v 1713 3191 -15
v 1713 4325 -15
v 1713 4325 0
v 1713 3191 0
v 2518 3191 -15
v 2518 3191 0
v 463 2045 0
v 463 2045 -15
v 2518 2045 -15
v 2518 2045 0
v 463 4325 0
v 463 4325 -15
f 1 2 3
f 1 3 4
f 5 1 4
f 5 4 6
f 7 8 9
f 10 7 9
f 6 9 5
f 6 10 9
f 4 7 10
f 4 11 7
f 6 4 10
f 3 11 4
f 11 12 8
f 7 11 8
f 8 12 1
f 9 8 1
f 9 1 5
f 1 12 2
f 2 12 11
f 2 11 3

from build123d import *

# Parameters (mm, degrees)
TABAN_FLAN_1_DEPTH          = 15
KES_EKSTR_ZYON1_DEPTH       = 6824.599709831
KES_EKSTR_ZYON1_DEPTH_BACK  = 6824.599709831
IZIM2_W                     = 2518
IZIM2_H                     = 130
KES_EKSTR_ZYON2_DEPTH       = 6824.599709831
KES_EKSTR_ZYON2_DEPTH_BACK  = 6824.599709831
IZIM3_W                     = 2518
IZIM3_H                     = 135
KES_EKSTR_ZYON3_DEPTH       = 6824.599709831
KES_EKSTR_ZYON3_DEPTH_BACK  = 6824.599709831
IZIM4_W                     = 848
IZIM4_H                     = 915
KES_EKSTR_ZYON4_DEPTH       = 5983.714935546
KES_EKSTR_ZYON4_DEPTH_BACK  = 5983.714935546
IZIM5_W                     = 848
IZIM5_H                     = 467
KES_EKSTR_ZYON5_DEPTH       = 5563.566763644
KES_EKSTR_ZYON5_DEPTH_BACK  = 5563.566763644
IZIM6_W                     = 2518
IZIM6_H                     = 805
IZIM6_W_2                   = 848
IZIM6_H_2                   = 3
KES_EKSTR_ZYON6_DEPTH       = 5560.891905424
KES_EKSTR_ZYON6_DEPTH_BACK  = 5560.891905424
IZIM7_W                     = 2518
IZIM7_H                     = 440
KES_EKSTR_ZYON7_DEPTH       = 5560.891905424
KES_EKSTR_ZYON7_DEPTH_BACK  = 5560.891905424
IZIM8_W                     = 2518
IZIM8_H                     = 102
KES_EKSTR_ZYON8_DEPTH       = 5560.891905424
KES_EKSTR_ZYON8_DEPTH_BACK  = 5560.891905424
IZIM9_W                     = 2518
IZIM9_H                     = 158
IZIM10_W                    = 542
IZIM10_H                    = 327
SEKME1_DEPTH                = 15
KES_EKSTR_ZYON9_DEPTH       = 5560.891905424
KES_EKSTR_ZYON9_DEPTH_BACK  = 5560.891905424
IZIM11_W                    = 1127
IZIM11_H                    = 305
IZIM12_W                    = 1390
IZIM12_H                    = 43
SEKME2_DEPTH                = 15
KES_EKSTR_ZYON10_DEPTH      = 5599.263034192
KES_EKSTR_ZYON10_DEPTH_BACK = 5599.263034192
IZIM13_W                    = 2518
IZIM13_H                    = 127
KES_EKSTR_ZYON11_DEPTH      = 5599.263034192
KES_EKSTR_ZYON11_DEPTH_BACK = 5599.263034192
IZIM14_W                    = 385
IZIM14_H                    = 675
IZIM14_W_2                  = 2518
IZIM14_H_2                  = 148
KES_EKSTR_ZYON12_DEPTH      = 5599.263034192
KES_EKSTR_ZYON12_DEPTH_BACK = 5599.263034192
IZIM15_W                    = 569.702453624
IZIM15_H                    = 675
KES_EKSTR_ZYON13_DEPTH      = 5599.263034192
KES_EKSTR_ZYON13_DEPTH_BACK = 5599.263034192
IZIM16_W                    = 1005
IZIM16_H                    = 305
KES_EKSTR_ZYON14_DEPTH      = 5328.623672896
KES_EKSTR_ZYON14_DEPTH_BACK = 5328.623672896
IZIM17_W                    = 200
IZIM17_H                    = 370
IZIM17_W_2                  = 3
IZIM17_H_2                  = 2280
KES_EKSTR_ZYON16_DEPTH      = 5005.615269928
KES_EKSTR_ZYON16_DEPTH_BACK = 5005.615269928
KES_EKSTR_ZYON17_DEPTH      = 5005.615269928
KES_EKSTR_ZYON17_DEPTH_BACK = 5005.615269928
IZIM20_W                    = 805
IZIM20_H                    = 164


# Sheet-metal steps are written as plain solids
with BuildPart() as part:
    # Çizim1 → Taban-Flanş1 (new body)
    with BuildSketch(Plane.XY):
        Polygon((0, 0), (0, 4630), (1505, 4630), (1505, 6342), (2518, 6342), (2518, 0), align=None)
    extrude(amount=-TABAN_FLAN_1_DEPTH)

    # Çizim2 → Kes-Ekstrüzyon1 (cut, two sides: drawn at the far end of the back side and taken through both)
    with BuildSketch(Plane.XY.offset(-KES_EKSTR_ZYON1_DEPTH_BACK)):
        with Locations((1259, 65)):
            Rectangle(IZIM2_W, IZIM2_H)
    extrude(amount=KES_EKSTR_ZYON1_DEPTH + KES_EKSTR_ZYON1_DEPTH_BACK, mode=Mode.SUBTRACT)

    # Çizim3 → Kes-Ekstrüzyon2 (cut, two sides: drawn at the far end of the back side and taken through both)
    with BuildSketch(Plane.XY.offset(-KES_EKSTR_ZYON2_DEPTH_BACK)):
        with Locations((1259, 197.5)):
            Rectangle(IZIM3_W, IZIM3_H)
    extrude(amount=KES_EKSTR_ZYON2_DEPTH + KES_EKSTR_ZYON2_DEPTH_BACK, mode=Mode.SUBTRACT)

    # Çizim4 → Kes-Ekstrüzyon3 (cut, two sides: drawn at the far end of the back side and taken through both)
    with BuildSketch(Plane.XY.offset(-KES_EKSTR_ZYON3_DEPTH_BACK)):
        with Locations((2094, 5884.5)):
            Rectangle(IZIM4_W, IZIM4_H)
        Polygon((1670, 6342), (1505, 6342), (1505, 4630), (1670, 4630), (1670, 5427), align=None)
    extrude(amount=KES_EKSTR_ZYON3_DEPTH + KES_EKSTR_ZYON3_DEPTH_BACK, mode=Mode.SUBTRACT)

    # Çizim5 → Kes-Ekstrüzyon4 (cut, two sides: drawn at the far end of the back side and taken through both)
    with BuildSketch(Plane.XY.offset(-KES_EKSTR_ZYON4_DEPTH_BACK)):
        with Locations((2094, 5193.5)):
            Rectangle(IZIM5_W, IZIM5_H)
    extrude(amount=KES_EKSTR_ZYON4_DEPTH + KES_EKSTR_ZYON4_DEPTH_BACK, mode=Mode.SUBTRACT)

    # Çizim6 → Kes-Ekstrüzyon5 (cut, two sides: drawn at the far end of the back side and taken through both)
    with BuildSketch(Plane.XY.offset(-KES_EKSTR_ZYON5_DEPTH_BACK)):
        with Locations((1259, 667.5)):
            Rectangle(IZIM6_W, IZIM6_H)
        with Locations((2094, 4958.5)):
            Rectangle(IZIM6_W_2, IZIM6_H_2)
    extrude(amount=KES_EKSTR_ZYON5_DEPTH + KES_EKSTR_ZYON5_DEPTH_BACK, mode=Mode.SUBTRACT)

    # Çizim7 → Kes-Ekstrüzyon6 (cut, two sides: drawn at the far end of the back side and taken through both)
    with BuildSketch(Plane.XY.offset(-KES_EKSTR_ZYON6_DEPTH_BACK)):
        with Locations((1259, 1290)):
            Rectangle(IZIM7_W, IZIM7_H)
    extrude(amount=KES_EKSTR_ZYON6_DEPTH + KES_EKSTR_ZYON6_DEPTH_BACK, mode=Mode.SUBTRACT)

    # Çizim8 → Kes-Ekstrüzyon7 (cut, two sides: drawn at the far end of the back side and taken through both)
    with BuildSketch(Plane.XY.offset(-KES_EKSTR_ZYON7_DEPTH_BACK)):
        with Locations((1259, 1561)):
            Rectangle(IZIM8_W, IZIM8_H)
    extrude(amount=KES_EKSTR_ZYON7_DEPTH + KES_EKSTR_ZYON7_DEPTH_BACK, mode=Mode.SUBTRACT)

    # Çizim9 → Kes-Ekstrüzyon8 (cut, two sides: drawn at the far end of the back side and taken through both)
    with BuildSketch(Plane.XY.offset(-KES_EKSTR_ZYON8_DEPTH_BACK)):
        with Locations((1259, 1691)):
            Rectangle(IZIM9_W, IZIM9_H)
    extrude(amount=KES_EKSTR_ZYON8_DEPTH + KES_EKSTR_ZYON8_DEPTH_BACK, mode=Mode.SUBTRACT)

    # Çizim10 → Sekme1 (add)
    with BuildSketch(Plane.XY):
        with Locations((1399, 4793.5)):
            Rectangle(IZIM10_W, IZIM10_H)
    extrude(amount=-SEKME1_DEPTH)

    # Çizim11 → Kes-Ekstrüzyon9 (cut, two sides: drawn at the far end of the back side and taken through both)
    with BuildSketch(Plane.XY.offset(-KES_EKSTR_ZYON9_DEPTH_BACK)):
        with Locations((563.5, 4477.5)):
            Rectangle(IZIM11_W, IZIM11_H)
    extrude(amount=KES_EKSTR_ZYON9_DEPTH + KES_EKSTR_ZYON9_DEPTH_BACK, mode=Mode.SUBTRACT)

    # Çizim12 → Sekme2 (add)
    with BuildSketch(Plane.XY):
        with Locations((1823, 4978.5)):
            Rectangle(IZIM12_W, IZIM12_H)
    extrude(amount=-SEKME2_DEPTH)

    # Çizim13 → Kes-Ekstrüzyon10 (cut, two sides: drawn at the far end of the back side and taken through both)
    with BuildSketch(Plane(origin=(0, 0, -15), x_dir=(-1, 0, 0), z_dir=(0, 0, -1)).offset(-KES_EKSTR_ZYON10_DEPTH_BACK)):
        with Locations((-1259, 1833.5)):
            Rectangle(IZIM13_W, IZIM13_H)
    extrude(amount=KES_EKSTR_ZYON10_DEPTH + KES_EKSTR_ZYON10_DEPTH_BACK, mode=Mode.SUBTRACT)

    # Çizim14 → Kes-Ekstrüzyon11 (cut, two sides: drawn at the far end of the back side and taken through both)
    with BuildSketch(Plane.XY.offset(-KES_EKSTR_ZYON11_DEPTH_BACK)):
        with Locations((1320.5, 4662.5)):
            Rectangle(IZIM14_W, IZIM14_H)
        with Locations((1259, 1971)):
            Rectangle(IZIM14_W_2, IZIM14_H_2)
    extrude(amount=KES_EKSTR_ZYON11_DEPTH + KES_EKSTR_ZYON11_DEPTH_BACK, mode=Mode.SUBTRACT)

    # Çizim15 → Kes-Ekstrüzyon12 (cut, two sides: drawn at the far end of the back side and taken through both)
    with BuildSketch(Plane.XY.offset(-KES_EKSTR_ZYON12_DEPTH_BACK)):
        with Locations((1228.148773188, 4662.5)):
            Rectangle(IZIM15_W, IZIM15_H)
    extrude(amount=KES_EKSTR_ZYON12_DEPTH + KES_EKSTR_ZYON12_DEPTH_BACK, mode=Mode.SUBTRACT)

    # Çizim16 → Kes-Ekstrüzyon13 (cut, two sides: drawn at the far end of the back side and taken through both)
    with BuildSketch(Plane.XY.offset(-KES_EKSTR_ZYON13_DEPTH_BACK)):
        with Locations((2015.5, 4847.5)):
            Rectangle(IZIM16_W, IZIM16_H)
    extrude(amount=KES_EKSTR_ZYON13_DEPTH + KES_EKSTR_ZYON13_DEPTH_BACK, mode=Mode.SUBTRACT)

    # Çizim17 → Kes-Ekstrüzyon14 (cut, two sides: drawn at the far end of the back side and taken through both)
    with BuildSketch(Plane.XY.offset(-KES_EKSTR_ZYON14_DEPTH_BACK)):
        Polygon((2518, 3355), (2518, 4695), (1713, 4695), (1713, 4325), (1713, 3355), align=None)
        with Locations((1613, 4510)):
            Rectangle(IZIM17_W, IZIM17_H)
        with Locations((1.5, 3185)):
            Rectangle(IZIM17_W_2, IZIM17_H_2)
    extrude(amount=KES_EKSTR_ZYON14_DEPTH + KES_EKSTR_ZYON14_DEPTH_BACK, mode=Mode.SUBTRACT)

    # Çizim19 → Kes-Ekstrüzyon16 (cut, two sides: drawn at the far end of the back side and taken through both)
    with BuildSketch(Plane.XY.offset(-KES_EKSTR_ZYON16_DEPTH_BACK)):
        Polygon((463, 4325), (463, 2045), (3, 2045), (0, 4325), align=None)
    extrude(amount=KES_EKSTR_ZYON16_DEPTH + KES_EKSTR_ZYON16_DEPTH_BACK, mode=Mode.SUBTRACT)

    # Çizim20 → Kes-Ekstrüzyon17 (cut, two sides: drawn at the far end of the back side and taken through both)
    with BuildSketch(Plane.XY.offset(-KES_EKSTR_ZYON17_DEPTH_BACK)):
        with Locations((2115.5, 3273)):
            Rectangle(IZIM20_W, IZIM20_H)
    extrude(amount=KES_EKSTR_ZYON17_DEPTH + KES_EKSTR_ZYON17_DEPTH_BACK, mode=Mode.SUBTRACT)


solid = part.part
